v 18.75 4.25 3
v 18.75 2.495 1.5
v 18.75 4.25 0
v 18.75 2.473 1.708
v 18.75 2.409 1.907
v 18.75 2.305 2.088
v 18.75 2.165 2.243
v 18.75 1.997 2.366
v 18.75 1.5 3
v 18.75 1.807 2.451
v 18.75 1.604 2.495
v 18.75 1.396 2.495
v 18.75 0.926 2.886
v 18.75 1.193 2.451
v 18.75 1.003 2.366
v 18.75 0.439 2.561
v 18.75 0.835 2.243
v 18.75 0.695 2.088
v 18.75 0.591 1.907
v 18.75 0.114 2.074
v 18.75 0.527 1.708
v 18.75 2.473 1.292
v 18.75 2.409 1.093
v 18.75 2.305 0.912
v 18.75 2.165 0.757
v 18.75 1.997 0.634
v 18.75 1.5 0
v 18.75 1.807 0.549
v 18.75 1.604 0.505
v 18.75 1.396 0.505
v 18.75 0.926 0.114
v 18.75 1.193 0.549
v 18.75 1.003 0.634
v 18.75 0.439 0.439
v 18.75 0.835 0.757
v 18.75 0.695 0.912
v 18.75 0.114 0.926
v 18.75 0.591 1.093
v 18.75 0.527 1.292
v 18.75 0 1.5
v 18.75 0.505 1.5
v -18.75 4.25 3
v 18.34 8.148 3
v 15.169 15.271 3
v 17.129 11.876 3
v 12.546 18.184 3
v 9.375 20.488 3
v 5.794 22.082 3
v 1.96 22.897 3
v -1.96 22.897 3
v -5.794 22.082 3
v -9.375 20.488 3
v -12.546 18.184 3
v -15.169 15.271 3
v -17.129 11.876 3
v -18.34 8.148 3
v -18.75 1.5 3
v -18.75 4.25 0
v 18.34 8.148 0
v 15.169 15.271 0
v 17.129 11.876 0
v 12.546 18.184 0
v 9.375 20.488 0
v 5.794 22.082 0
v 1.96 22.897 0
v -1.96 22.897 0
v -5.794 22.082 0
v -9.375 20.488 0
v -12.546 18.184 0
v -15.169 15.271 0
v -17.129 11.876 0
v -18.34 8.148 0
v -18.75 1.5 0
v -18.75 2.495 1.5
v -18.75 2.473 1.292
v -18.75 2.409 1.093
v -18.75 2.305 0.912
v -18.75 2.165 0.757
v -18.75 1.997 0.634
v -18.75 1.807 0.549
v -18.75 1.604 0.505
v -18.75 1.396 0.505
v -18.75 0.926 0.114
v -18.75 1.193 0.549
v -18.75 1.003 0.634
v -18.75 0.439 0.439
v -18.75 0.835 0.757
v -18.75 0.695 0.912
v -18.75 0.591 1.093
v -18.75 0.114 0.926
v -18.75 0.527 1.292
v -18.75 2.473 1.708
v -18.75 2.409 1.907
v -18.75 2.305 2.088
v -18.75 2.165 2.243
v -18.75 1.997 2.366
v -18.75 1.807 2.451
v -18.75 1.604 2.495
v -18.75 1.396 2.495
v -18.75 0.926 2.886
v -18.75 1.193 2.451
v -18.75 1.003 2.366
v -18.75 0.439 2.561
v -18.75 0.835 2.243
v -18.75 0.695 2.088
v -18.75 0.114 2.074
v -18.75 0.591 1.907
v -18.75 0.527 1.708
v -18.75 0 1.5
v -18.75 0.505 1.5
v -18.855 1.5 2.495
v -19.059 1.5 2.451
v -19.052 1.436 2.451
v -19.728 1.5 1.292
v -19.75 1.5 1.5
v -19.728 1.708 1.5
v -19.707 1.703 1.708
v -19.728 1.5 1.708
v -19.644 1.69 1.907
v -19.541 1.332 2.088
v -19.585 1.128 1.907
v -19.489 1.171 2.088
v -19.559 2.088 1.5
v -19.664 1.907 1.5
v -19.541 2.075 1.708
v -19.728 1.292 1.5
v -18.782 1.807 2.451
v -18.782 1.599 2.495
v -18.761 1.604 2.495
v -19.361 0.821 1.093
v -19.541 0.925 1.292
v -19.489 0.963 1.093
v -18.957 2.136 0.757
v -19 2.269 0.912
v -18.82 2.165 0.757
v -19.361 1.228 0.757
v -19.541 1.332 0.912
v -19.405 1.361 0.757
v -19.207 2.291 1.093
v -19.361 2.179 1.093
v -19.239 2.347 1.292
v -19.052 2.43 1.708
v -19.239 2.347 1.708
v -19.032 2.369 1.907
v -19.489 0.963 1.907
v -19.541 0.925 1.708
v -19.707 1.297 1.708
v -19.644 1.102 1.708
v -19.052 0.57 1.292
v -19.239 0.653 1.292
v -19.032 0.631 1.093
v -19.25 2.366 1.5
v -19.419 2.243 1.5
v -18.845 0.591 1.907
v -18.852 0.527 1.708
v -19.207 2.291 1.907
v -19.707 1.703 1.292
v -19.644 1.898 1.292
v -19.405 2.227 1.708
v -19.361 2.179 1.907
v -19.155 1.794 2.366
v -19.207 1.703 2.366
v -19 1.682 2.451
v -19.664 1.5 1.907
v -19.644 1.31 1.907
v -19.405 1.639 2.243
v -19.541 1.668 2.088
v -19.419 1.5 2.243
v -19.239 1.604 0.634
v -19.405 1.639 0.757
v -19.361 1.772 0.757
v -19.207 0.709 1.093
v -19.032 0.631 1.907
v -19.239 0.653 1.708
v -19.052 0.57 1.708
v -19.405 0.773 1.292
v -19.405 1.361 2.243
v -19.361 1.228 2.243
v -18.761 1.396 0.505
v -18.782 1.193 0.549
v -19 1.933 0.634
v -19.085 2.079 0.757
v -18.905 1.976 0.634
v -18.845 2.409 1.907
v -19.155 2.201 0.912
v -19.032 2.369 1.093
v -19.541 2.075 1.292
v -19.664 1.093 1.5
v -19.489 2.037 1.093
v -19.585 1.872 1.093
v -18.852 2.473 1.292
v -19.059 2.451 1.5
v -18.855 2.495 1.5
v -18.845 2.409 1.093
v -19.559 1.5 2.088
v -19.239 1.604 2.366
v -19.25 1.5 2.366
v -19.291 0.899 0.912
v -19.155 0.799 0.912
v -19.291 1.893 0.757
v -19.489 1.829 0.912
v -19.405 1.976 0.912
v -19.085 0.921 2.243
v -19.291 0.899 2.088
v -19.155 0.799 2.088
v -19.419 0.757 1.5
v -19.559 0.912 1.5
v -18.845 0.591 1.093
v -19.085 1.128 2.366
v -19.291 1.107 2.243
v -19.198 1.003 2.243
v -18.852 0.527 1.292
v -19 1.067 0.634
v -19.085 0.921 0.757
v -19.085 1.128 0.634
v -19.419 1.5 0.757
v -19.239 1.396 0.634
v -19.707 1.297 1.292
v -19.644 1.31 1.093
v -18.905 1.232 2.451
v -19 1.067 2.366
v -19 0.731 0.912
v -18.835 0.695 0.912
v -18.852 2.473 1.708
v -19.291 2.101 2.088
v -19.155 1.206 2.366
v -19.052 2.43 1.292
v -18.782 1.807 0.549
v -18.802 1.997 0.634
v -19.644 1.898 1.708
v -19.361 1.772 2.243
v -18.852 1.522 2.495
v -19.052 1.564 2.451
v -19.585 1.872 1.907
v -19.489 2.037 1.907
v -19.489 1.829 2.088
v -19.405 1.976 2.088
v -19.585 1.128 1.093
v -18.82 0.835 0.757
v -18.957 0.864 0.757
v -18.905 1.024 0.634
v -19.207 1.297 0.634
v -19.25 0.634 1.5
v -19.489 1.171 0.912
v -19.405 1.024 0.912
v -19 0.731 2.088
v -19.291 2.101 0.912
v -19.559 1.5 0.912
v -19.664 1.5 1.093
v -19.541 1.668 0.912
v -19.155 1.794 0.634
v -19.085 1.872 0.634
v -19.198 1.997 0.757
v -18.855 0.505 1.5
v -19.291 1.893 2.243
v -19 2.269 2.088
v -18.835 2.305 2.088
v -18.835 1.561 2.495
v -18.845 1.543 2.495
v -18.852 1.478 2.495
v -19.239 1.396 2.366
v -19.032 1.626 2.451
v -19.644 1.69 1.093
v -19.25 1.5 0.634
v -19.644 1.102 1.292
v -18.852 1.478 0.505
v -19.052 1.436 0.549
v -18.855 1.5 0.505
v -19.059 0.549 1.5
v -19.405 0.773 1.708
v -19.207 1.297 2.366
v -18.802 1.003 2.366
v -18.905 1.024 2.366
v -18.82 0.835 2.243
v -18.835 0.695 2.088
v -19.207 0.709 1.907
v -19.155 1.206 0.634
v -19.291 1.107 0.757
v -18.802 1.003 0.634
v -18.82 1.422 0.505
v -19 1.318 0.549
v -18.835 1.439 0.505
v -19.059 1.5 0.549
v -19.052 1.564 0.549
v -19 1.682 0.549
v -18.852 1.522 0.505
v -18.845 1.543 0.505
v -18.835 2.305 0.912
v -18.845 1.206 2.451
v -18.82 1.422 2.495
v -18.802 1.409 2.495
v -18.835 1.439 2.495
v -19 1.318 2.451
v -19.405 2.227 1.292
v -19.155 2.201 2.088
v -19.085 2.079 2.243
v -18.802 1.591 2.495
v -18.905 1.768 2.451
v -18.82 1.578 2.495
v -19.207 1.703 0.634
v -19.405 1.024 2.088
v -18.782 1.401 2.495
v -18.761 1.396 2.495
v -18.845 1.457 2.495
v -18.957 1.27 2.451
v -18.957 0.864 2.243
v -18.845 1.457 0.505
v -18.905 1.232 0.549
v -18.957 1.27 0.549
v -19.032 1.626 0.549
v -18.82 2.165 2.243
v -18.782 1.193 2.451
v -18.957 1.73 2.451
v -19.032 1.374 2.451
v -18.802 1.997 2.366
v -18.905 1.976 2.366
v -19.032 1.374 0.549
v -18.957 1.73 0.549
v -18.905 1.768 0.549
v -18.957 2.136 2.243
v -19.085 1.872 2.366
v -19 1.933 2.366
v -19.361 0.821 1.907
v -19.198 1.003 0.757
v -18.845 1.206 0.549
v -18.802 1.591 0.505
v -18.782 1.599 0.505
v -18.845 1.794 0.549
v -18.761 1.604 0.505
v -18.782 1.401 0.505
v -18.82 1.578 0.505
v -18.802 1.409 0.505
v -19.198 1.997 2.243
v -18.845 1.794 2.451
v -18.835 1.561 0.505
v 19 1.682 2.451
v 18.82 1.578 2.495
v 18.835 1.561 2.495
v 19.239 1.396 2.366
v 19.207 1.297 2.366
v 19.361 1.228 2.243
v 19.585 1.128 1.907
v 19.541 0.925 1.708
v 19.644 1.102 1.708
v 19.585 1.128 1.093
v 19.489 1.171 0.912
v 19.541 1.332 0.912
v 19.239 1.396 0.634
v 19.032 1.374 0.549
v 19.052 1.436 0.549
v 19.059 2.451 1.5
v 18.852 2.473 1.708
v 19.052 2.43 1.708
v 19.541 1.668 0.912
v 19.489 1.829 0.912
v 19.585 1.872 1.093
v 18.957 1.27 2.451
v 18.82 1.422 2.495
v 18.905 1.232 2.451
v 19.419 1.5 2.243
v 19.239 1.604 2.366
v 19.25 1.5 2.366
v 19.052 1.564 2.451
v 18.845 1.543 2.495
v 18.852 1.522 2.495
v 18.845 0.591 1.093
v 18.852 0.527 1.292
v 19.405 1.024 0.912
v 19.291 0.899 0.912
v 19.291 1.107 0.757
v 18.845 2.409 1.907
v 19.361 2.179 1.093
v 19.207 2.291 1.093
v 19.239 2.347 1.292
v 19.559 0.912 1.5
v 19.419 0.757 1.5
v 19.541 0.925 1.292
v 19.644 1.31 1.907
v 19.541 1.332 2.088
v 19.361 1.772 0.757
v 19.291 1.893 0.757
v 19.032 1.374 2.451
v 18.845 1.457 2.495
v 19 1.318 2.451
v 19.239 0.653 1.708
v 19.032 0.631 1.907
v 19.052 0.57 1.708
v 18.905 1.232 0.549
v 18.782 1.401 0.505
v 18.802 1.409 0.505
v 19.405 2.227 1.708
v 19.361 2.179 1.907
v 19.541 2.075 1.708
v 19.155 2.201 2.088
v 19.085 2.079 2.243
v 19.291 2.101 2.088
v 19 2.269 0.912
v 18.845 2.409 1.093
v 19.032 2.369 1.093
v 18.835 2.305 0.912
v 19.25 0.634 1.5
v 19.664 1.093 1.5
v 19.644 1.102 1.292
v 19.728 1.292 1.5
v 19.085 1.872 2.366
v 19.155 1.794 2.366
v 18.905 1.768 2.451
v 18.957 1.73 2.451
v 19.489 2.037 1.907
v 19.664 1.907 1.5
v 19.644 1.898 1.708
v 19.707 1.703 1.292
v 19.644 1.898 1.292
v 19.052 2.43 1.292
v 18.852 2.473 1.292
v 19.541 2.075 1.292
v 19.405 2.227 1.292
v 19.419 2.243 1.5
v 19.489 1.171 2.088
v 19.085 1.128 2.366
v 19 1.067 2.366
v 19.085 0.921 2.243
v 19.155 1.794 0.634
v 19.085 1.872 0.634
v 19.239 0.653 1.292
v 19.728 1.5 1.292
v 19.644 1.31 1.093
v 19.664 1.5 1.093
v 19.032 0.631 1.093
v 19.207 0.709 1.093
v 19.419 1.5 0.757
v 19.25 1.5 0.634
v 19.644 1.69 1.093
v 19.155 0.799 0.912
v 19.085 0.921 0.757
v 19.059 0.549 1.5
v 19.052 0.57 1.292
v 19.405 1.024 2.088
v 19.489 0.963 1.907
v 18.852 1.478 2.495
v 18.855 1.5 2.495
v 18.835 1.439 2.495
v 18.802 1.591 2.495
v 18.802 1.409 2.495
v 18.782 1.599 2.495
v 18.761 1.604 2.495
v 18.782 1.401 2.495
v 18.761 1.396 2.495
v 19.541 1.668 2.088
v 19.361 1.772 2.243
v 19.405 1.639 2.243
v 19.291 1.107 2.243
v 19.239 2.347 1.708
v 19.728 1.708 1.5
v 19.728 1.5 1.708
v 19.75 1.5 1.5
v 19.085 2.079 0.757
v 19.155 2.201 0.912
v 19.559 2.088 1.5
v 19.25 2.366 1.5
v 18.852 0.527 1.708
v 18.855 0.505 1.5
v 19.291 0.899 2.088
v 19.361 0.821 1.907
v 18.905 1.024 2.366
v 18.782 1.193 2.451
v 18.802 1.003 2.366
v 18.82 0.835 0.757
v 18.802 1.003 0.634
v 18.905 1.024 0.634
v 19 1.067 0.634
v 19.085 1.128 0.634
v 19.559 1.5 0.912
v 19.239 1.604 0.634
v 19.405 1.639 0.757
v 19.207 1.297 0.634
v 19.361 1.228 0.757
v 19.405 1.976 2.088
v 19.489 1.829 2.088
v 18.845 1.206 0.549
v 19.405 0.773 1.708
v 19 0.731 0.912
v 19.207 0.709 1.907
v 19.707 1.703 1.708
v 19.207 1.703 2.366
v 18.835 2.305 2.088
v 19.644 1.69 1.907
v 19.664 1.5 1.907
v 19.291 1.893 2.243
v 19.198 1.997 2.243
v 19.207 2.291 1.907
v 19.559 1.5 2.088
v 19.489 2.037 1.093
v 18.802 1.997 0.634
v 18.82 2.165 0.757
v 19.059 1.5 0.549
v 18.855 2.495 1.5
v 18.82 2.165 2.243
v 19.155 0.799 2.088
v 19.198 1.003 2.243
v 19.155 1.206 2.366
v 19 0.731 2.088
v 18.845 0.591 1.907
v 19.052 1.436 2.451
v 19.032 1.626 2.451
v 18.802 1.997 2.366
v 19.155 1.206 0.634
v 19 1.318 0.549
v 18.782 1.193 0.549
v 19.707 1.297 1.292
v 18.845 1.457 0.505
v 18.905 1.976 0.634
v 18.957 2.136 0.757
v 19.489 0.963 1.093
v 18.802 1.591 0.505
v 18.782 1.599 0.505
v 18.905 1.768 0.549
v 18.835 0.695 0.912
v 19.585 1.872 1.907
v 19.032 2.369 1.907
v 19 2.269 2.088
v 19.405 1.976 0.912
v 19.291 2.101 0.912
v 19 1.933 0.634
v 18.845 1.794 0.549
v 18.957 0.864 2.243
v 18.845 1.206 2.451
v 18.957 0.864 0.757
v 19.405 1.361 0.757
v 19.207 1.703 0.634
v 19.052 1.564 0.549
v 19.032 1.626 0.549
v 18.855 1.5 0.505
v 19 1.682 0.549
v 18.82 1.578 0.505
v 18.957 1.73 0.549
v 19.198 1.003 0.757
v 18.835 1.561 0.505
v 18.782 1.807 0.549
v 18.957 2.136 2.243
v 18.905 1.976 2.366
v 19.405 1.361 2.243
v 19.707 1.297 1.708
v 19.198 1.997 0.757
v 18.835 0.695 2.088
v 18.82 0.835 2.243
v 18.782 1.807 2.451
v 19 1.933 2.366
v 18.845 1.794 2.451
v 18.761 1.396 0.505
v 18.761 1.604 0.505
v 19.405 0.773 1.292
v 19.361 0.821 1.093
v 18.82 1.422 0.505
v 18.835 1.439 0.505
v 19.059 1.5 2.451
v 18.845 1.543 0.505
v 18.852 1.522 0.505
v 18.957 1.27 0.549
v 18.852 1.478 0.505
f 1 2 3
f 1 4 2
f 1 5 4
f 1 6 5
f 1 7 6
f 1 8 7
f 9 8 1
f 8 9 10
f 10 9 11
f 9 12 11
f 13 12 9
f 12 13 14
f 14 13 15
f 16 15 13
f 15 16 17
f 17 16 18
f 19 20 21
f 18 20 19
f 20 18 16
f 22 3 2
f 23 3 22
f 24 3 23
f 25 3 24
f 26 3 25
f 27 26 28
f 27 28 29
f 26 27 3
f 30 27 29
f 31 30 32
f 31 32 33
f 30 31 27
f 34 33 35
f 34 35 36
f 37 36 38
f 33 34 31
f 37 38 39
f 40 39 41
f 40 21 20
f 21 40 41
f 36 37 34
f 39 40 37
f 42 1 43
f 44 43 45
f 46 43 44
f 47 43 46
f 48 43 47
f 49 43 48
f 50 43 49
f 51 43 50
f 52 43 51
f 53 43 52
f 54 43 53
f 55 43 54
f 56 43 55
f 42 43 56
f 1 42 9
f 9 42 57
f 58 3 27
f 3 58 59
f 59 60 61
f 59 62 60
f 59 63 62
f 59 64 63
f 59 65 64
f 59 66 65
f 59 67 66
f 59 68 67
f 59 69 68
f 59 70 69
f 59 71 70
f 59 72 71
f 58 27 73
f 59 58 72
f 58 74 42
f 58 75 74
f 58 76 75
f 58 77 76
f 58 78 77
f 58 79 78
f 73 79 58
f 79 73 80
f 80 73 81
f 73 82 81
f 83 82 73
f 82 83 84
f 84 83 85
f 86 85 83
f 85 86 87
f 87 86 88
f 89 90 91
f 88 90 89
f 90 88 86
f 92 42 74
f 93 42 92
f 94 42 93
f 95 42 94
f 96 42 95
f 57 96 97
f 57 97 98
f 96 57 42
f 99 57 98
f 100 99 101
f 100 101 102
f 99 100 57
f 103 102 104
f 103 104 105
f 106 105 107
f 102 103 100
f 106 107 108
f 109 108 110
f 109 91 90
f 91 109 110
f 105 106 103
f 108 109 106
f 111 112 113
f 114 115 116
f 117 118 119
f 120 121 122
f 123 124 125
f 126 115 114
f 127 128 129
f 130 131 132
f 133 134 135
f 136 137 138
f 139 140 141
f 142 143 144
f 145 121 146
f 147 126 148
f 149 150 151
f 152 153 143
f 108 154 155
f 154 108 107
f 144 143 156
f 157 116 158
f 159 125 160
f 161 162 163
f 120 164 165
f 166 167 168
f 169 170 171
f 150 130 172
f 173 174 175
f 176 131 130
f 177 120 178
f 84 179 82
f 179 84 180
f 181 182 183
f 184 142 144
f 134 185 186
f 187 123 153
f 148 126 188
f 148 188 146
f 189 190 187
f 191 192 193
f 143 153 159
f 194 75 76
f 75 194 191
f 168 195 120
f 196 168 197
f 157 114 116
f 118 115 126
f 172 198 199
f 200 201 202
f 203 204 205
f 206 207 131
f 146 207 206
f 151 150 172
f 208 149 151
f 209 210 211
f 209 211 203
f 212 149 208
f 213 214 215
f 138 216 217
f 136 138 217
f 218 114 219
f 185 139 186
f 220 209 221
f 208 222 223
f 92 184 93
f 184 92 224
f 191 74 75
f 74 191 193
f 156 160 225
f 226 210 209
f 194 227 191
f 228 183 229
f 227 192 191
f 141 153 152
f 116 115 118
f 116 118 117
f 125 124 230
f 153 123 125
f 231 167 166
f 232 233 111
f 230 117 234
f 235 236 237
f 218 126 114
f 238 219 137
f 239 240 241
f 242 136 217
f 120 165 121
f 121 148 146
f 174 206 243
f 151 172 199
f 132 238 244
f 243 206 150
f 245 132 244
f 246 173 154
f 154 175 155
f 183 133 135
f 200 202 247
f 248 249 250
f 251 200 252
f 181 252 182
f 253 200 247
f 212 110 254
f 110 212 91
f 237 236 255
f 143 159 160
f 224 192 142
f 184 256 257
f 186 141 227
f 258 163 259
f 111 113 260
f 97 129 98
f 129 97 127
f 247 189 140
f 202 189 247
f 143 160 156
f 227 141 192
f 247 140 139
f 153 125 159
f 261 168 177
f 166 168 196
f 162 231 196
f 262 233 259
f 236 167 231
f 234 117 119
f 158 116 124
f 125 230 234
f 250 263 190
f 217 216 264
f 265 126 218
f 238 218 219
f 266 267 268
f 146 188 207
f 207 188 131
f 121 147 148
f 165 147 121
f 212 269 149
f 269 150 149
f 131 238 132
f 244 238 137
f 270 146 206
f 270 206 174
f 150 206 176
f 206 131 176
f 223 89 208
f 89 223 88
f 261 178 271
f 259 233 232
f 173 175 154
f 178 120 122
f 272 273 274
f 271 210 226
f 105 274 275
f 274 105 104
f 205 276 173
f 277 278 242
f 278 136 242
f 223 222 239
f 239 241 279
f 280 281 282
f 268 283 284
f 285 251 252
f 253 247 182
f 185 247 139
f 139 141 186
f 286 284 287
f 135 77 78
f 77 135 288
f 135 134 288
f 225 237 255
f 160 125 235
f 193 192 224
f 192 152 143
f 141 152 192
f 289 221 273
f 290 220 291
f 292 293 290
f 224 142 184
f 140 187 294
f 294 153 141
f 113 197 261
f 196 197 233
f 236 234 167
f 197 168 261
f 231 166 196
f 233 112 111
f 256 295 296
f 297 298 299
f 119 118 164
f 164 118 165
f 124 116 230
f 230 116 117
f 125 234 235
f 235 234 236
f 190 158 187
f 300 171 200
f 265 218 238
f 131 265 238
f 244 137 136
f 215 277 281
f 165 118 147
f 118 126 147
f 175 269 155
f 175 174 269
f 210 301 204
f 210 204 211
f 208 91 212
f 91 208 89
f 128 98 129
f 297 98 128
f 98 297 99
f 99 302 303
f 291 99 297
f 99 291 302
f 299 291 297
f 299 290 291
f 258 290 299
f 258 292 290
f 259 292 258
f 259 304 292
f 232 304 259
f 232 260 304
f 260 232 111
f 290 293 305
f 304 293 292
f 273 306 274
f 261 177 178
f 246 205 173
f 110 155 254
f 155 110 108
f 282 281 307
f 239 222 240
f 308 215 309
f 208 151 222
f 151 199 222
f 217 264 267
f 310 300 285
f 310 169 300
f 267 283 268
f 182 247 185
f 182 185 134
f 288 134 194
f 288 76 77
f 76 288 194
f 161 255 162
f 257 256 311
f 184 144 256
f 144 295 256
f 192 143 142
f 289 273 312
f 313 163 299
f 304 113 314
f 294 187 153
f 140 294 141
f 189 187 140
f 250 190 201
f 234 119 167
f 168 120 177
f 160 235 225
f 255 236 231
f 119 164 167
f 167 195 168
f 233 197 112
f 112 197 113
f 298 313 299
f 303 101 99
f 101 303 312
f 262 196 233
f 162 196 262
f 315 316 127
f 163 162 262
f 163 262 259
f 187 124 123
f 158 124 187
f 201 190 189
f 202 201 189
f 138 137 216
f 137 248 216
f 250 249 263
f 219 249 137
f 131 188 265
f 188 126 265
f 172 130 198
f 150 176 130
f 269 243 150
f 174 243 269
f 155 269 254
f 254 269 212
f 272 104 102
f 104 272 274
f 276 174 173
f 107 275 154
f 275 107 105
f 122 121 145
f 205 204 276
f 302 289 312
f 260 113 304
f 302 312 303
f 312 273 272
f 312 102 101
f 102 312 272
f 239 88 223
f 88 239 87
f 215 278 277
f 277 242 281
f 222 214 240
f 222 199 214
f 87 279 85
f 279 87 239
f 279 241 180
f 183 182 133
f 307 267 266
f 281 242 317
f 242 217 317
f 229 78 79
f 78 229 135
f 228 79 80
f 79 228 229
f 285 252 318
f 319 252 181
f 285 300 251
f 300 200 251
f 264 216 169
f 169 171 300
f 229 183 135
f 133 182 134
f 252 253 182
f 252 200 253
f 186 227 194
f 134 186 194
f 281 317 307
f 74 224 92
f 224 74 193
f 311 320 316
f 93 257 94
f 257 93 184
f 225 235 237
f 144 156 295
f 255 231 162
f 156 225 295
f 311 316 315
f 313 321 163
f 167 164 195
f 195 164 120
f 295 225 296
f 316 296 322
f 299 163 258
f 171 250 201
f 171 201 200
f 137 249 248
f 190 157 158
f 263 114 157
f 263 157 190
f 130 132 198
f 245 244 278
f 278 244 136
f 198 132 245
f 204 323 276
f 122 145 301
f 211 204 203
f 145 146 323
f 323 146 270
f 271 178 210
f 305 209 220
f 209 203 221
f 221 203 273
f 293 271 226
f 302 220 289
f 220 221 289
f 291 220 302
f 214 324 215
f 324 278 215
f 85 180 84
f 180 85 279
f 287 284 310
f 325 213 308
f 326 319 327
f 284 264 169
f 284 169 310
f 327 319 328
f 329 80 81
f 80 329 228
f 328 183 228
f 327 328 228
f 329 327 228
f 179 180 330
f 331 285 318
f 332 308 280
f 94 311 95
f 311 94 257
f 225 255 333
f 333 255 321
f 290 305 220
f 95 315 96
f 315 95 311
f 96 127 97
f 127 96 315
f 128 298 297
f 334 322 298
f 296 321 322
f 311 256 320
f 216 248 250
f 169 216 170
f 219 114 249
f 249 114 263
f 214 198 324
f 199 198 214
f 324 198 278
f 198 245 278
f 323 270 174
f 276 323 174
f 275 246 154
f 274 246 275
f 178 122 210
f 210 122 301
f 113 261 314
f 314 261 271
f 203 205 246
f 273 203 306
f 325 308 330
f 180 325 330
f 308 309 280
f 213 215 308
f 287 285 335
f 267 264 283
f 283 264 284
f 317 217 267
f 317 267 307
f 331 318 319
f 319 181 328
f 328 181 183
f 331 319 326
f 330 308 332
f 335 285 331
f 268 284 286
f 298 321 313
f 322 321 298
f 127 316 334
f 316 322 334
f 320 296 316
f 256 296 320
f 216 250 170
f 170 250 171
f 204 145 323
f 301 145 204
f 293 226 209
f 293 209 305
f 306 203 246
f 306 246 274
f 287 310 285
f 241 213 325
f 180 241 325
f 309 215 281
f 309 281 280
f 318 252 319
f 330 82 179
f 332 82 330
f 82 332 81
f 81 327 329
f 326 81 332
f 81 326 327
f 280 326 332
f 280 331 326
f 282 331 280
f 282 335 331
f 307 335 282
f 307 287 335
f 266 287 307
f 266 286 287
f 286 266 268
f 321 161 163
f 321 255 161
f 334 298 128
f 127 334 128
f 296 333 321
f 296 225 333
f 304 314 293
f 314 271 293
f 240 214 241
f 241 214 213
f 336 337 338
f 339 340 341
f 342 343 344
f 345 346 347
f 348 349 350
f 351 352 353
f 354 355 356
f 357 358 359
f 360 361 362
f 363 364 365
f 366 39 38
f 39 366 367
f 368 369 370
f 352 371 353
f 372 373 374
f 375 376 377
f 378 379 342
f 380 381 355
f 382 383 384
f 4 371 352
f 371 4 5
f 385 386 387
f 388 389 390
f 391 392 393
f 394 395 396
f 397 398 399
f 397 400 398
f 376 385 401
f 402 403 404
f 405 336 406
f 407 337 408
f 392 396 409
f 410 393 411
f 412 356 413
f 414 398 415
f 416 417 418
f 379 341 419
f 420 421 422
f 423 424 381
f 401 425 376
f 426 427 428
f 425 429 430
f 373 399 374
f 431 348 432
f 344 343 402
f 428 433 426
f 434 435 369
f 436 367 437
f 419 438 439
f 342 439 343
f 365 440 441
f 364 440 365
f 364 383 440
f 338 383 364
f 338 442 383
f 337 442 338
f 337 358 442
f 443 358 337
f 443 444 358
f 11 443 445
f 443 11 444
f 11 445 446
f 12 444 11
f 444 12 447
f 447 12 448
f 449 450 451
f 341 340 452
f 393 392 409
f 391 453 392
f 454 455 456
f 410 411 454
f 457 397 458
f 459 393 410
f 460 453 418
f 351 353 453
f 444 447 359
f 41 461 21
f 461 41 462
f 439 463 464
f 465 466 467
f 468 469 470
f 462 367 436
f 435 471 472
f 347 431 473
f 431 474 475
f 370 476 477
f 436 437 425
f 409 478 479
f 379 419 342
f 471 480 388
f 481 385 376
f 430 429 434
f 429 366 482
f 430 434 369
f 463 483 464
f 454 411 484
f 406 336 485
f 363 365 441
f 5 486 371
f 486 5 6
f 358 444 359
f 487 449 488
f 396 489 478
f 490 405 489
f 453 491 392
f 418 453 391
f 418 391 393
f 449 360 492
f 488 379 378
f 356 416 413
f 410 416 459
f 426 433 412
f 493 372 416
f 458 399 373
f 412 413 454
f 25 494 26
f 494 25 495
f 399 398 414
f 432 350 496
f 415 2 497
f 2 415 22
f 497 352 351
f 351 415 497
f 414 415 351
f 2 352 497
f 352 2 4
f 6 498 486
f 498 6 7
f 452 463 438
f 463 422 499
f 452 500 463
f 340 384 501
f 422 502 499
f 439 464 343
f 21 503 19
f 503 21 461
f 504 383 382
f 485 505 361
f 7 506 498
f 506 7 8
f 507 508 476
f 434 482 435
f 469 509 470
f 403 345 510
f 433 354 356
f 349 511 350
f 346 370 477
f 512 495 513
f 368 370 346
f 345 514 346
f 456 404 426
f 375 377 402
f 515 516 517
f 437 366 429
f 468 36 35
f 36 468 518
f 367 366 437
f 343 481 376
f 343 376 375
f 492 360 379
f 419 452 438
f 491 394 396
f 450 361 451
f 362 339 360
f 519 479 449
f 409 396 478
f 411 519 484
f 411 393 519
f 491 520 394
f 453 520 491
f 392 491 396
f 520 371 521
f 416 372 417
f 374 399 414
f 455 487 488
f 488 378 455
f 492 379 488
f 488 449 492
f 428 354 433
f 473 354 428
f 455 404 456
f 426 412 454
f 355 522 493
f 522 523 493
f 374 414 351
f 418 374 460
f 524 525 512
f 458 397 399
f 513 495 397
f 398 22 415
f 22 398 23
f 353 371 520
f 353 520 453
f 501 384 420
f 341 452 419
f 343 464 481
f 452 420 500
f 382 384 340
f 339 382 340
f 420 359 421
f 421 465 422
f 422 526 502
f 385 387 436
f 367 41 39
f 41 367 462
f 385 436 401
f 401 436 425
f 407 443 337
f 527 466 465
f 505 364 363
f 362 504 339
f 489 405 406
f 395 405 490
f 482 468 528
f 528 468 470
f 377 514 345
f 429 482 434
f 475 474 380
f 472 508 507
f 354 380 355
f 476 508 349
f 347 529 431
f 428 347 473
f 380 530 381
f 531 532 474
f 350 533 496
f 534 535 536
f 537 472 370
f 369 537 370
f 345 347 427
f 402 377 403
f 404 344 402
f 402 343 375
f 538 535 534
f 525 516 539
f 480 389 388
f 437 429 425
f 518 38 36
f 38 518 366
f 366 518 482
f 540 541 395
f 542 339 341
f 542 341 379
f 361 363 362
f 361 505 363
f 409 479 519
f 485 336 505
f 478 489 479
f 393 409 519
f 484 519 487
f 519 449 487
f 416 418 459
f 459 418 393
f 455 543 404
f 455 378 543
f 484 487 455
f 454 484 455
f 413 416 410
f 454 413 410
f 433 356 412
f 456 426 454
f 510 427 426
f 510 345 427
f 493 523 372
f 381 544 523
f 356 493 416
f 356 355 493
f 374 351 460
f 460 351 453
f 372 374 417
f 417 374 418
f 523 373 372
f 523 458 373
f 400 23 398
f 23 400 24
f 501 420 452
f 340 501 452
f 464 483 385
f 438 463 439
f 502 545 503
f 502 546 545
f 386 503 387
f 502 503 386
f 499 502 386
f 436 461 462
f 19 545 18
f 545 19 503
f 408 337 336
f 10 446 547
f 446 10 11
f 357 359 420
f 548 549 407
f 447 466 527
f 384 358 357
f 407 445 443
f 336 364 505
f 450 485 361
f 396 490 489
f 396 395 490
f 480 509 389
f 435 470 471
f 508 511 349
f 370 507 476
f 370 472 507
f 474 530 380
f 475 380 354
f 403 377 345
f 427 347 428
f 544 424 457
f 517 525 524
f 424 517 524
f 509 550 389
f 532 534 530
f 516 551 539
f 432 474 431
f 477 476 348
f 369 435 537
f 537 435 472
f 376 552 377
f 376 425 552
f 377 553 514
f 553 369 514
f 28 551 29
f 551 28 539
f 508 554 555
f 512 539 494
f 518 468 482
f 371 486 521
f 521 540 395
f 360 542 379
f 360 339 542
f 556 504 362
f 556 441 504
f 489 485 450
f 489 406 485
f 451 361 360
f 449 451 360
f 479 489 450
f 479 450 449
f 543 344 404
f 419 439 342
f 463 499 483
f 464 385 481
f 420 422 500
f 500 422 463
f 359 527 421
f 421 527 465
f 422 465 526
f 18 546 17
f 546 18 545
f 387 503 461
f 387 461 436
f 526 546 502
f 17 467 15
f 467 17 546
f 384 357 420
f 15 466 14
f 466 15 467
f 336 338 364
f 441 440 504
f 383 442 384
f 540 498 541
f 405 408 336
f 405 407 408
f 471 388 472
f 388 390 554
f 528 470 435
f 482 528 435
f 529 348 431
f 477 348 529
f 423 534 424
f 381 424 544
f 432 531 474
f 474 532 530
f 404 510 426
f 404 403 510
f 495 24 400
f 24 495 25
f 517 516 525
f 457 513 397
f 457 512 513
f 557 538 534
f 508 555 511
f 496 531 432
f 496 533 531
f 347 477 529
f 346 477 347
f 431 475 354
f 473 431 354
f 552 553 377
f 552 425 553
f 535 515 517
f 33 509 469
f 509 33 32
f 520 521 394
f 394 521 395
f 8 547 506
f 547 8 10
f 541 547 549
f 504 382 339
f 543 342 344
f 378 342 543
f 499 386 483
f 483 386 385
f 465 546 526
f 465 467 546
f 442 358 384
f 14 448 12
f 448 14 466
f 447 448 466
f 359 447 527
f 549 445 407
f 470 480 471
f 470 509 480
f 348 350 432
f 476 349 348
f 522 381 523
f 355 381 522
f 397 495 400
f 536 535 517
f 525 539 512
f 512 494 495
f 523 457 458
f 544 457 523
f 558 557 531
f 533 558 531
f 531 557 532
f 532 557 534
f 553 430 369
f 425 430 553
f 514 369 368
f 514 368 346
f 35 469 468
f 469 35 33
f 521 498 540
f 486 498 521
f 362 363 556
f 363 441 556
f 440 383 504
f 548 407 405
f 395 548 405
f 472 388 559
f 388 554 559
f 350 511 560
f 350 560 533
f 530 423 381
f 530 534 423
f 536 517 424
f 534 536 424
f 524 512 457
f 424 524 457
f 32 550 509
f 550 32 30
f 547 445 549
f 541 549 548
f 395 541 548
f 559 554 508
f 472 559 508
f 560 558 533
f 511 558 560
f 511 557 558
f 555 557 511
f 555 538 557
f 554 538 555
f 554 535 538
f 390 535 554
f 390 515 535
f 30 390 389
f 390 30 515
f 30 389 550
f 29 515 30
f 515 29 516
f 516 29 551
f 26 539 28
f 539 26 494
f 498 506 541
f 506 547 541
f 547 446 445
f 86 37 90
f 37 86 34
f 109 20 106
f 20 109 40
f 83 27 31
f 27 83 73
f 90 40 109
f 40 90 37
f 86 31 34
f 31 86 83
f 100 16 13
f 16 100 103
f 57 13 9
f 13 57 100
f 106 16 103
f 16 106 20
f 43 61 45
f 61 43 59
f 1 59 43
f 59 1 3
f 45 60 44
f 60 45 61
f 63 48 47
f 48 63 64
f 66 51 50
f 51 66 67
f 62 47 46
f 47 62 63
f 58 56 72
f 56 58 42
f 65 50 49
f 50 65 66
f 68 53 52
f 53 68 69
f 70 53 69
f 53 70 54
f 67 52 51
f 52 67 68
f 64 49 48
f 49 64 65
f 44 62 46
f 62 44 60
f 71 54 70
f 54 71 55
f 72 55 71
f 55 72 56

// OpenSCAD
// Raceway Targets
//
// Changes:
//   2011/09/16
//    - Added Froggie (Cleaned).
//    - Added SpookyCat.
//    - Added ChickenCrossesTheRoad.

stand_w=50;
stand_l=75;
stand_th=3.0;
stand_peg_d=2.0;
hinge_w=3*50/4;
hinge_inset=75/4;
slot_l=75;
card_th=0.6;
card_cut_angle=45;

//render_part=1; // Uncomment to generate a stand();
//render_part=2; // Uncomment to generate a hinge();
//render_part=3; // Uncomment to generate a stand and hinge();
//render_part=4; // Uncomment to generate card_hinge();
//render_part=5; // Uncomment to generate a SlowChildren
//render_part=6; // Uncomment to generate a LittleOldLady; doesn't work with this dxf.
//render_part=8; // Uncomment to generate Froggie
render_part=9; // Uncomment to generate SpookyCat
render_part=10; // Uncomment to generate ChickenCrossesTheRoad

module stand(w=50,l=75,slot_w=3*50/4,slot_inset=75/4,slot_l=75,h=5.0,plate_angle=10,plate_l=15.0,peg_d=3.0,space=1.0) {
  difference() {
    union() {
      translate([-w/2,0,0]) cube(size=[w,l,h],center=false);
      translate([-3*w/8,0,h]) rotate([plate_angle,0,0])
        translate([0,0,-h]) cube(size=[3*w/4,plate_l,h],center=false);
    }
    translate([-slot_w/2,slot_inset,-0.1]) cube(size=[slot_w,slot_l,2*0.1+h],center=false);
    translate([-slot_w/2,slot_inset+h,h/2]) sphere($fs=0.1,r=peg_d/2,center=true);
    translate([ slot_w/2,slot_inset+h,h/2]) sphere($fs=0.1,r=peg_d/2,center=true);
    translate([-slot_w/2-peg_d/2-space/2,slot_inset+h+1.5*peg_d,-0.1]) cube(size=[slot_w+peg_d+space,slot_l,2*0.1+h],center=false);
    translate([-w/2+3*peg_d,3*peg_d,-0.1]) cylinder($fn=8,r=peg_d,h=2*stand_th,center=false);
    translate([w/2-3*peg_d,3*peg_d,-0.1]) cylinder($fn=8,r=peg_d,h=2*stand_th,center=false);
  }
}

if(render_part==1) {
  stand(w=stand_w,l=stand_l,h=stand_th,slot_inset=hinge_inset,peg_d=stand_peg_d);
}

module hinge(w=3*50/4,l=75-75/4,h=5.0,peg_d=3.0) {
  union() {
    translate([-w/2,h/2,0]) cube(size=[w,l-h/2,h], center=false);
    translate([-w/2,h/2,h/2]) sphere($fs=0.1,r=peg_d/2,center=true);
    translate([ w/2,h/2,h/2]) sphere($fs=0.1,r=peg_d/2,center=true);
    translate([-w/2,h/2,h/2]) rotate([0,90,0]) cylinder($fn=16,r=h/2,h=w,center=false);
  }
}

if(render_part==2) {
  hinge(w=hinge_w,l=stand_l-hinge_inset,h=stand_th,peg_d=stand_peg_d);
}

if(render_part==3) {
  stand(w=stand_w,l=stand_l,h=stand_th,,slot_inset=hinge_inset,peg_d=stand_peg_d);
  translate([0,hinge_inset+stand_th+stand_peg_d+stand_th/2,0]) hinge(w=hinge_w,l=stand_l-hinge_inset,h=stand_th,peg_d=stand_peg_d);
}

module card_hinge(w=3*50/4,l=75/4,h=5.0,peg_d=3.0, card_th=0.2, cut_angle=60) {
  difference() {
    hinge(w=w,l=l,h=h,peg_d=peg_d);
    translate([-w/4,l,h/2]) rotate([0,cut_angle,0]) cube(size=[card_th,3*h,2*h],center=true);
    translate([w/4,l,h/2]) rotate([0,-cut_angle,0]) cube(size=[card_th,3*h,2*h],center=true);
  }
}

if(render_part==4) {
  card_hinge(w=hinge_w,l=hinge_inset/2,h=stand_th,peg_d=stand_peg_d,card_th=card_th,cut_angle=card_cut_angle);
}

module hinge_with_profile(w=3*50/4,l=75/4,h=5.0,peg_d=3.0
	,image_x=-15,image_y=10,dxf_scale=10.0,profile_h=6.0,rounded=false
	,profile_colour=[1,0,0]
	){
  union() {
    if(!rounded) hinge(w=w,l=l,h=h,peg_d=peg_d);
    if(rounded) union() {
      hinge(w=w,l=l-w/2,h=h,peg_d=peg_d);
      translate([0,l-w/2,0]) difference() {
        cylinder(r=w/2,h=h,center=false);
        translate([0,-w/2,0]) cube(size=[w,w,3*h],center=true);
      }
    }
    color(profile_colour) translate([image_x,image_y,0]) linear_extrude(height=profile_h) scale(dxf_scale) child(0);
  }
}

// Slow Children
if(render_part==5) {
  hinge_with_profile(w=hinge_w,l=6.5,h=stand_th,peg_d=stand_peg_d,image_x=-20,image_y=5,dxf_scale=14,profile_h=5.0) {
    import(file="dxf/SlowChildren.dxf");
  }
}

// These LittleOldLady attemptsdon't work yet.
if(render_part==6) {
//  difference() {
//    import_dxf(file="dxf/LittleOldLady_Outer.dxf");
//    import_dxf(file="dxf/LittleOldLady_Inner.dxf");
//  }
    import_dxf(file="dxf/LittleOldLadyV2.dxf");
}

if(render_part==7) {
  hinge_with_profile(w=hinge_w,l=6.5,h=stand_th,peg_d=stand_peg_d,image_x=-20,image_y=5,dxf_scale=14,profile_h=5.0) {
    import_dxf(file="dxf/LittleOldLadyV2.dxf");
  }
}

// Froggie
if(render_part==8) {
  hinge_with_profile(w=hinge_w,l=32,h=stand_th,peg_d=stand_peg_d,image_x=-21.5,image_y=6,dxf_scale=14,profile_h=5.0,rounded=true) {
    import(file="dxf/Froggie_Cleaned.dxf");
  }
}

// SpookyCat
if(render_part==9) {
  hinge_with_profile(w=hinge_w,l=23,h=stand_th,peg_d=stand_peg_d,image_x=-17,image_y=6,dxf_scale=18,profile_h=5.0,rounded=true) {
    import(file="dxf/SpookyCat.dxf");
  }
}

// ChickenCrossesTheRoad
if(render_part==10) {
  hinge_with_profile(w=hinge_w,l=23,h=stand_th,peg_d=stand_peg_d,image_x=-25,image_y=6,dxf_scale=14,profile_h=5.0,rounded=true) {
    import(file="dxf/ChickenCrossesTheRoad.dxf");
  }
}
